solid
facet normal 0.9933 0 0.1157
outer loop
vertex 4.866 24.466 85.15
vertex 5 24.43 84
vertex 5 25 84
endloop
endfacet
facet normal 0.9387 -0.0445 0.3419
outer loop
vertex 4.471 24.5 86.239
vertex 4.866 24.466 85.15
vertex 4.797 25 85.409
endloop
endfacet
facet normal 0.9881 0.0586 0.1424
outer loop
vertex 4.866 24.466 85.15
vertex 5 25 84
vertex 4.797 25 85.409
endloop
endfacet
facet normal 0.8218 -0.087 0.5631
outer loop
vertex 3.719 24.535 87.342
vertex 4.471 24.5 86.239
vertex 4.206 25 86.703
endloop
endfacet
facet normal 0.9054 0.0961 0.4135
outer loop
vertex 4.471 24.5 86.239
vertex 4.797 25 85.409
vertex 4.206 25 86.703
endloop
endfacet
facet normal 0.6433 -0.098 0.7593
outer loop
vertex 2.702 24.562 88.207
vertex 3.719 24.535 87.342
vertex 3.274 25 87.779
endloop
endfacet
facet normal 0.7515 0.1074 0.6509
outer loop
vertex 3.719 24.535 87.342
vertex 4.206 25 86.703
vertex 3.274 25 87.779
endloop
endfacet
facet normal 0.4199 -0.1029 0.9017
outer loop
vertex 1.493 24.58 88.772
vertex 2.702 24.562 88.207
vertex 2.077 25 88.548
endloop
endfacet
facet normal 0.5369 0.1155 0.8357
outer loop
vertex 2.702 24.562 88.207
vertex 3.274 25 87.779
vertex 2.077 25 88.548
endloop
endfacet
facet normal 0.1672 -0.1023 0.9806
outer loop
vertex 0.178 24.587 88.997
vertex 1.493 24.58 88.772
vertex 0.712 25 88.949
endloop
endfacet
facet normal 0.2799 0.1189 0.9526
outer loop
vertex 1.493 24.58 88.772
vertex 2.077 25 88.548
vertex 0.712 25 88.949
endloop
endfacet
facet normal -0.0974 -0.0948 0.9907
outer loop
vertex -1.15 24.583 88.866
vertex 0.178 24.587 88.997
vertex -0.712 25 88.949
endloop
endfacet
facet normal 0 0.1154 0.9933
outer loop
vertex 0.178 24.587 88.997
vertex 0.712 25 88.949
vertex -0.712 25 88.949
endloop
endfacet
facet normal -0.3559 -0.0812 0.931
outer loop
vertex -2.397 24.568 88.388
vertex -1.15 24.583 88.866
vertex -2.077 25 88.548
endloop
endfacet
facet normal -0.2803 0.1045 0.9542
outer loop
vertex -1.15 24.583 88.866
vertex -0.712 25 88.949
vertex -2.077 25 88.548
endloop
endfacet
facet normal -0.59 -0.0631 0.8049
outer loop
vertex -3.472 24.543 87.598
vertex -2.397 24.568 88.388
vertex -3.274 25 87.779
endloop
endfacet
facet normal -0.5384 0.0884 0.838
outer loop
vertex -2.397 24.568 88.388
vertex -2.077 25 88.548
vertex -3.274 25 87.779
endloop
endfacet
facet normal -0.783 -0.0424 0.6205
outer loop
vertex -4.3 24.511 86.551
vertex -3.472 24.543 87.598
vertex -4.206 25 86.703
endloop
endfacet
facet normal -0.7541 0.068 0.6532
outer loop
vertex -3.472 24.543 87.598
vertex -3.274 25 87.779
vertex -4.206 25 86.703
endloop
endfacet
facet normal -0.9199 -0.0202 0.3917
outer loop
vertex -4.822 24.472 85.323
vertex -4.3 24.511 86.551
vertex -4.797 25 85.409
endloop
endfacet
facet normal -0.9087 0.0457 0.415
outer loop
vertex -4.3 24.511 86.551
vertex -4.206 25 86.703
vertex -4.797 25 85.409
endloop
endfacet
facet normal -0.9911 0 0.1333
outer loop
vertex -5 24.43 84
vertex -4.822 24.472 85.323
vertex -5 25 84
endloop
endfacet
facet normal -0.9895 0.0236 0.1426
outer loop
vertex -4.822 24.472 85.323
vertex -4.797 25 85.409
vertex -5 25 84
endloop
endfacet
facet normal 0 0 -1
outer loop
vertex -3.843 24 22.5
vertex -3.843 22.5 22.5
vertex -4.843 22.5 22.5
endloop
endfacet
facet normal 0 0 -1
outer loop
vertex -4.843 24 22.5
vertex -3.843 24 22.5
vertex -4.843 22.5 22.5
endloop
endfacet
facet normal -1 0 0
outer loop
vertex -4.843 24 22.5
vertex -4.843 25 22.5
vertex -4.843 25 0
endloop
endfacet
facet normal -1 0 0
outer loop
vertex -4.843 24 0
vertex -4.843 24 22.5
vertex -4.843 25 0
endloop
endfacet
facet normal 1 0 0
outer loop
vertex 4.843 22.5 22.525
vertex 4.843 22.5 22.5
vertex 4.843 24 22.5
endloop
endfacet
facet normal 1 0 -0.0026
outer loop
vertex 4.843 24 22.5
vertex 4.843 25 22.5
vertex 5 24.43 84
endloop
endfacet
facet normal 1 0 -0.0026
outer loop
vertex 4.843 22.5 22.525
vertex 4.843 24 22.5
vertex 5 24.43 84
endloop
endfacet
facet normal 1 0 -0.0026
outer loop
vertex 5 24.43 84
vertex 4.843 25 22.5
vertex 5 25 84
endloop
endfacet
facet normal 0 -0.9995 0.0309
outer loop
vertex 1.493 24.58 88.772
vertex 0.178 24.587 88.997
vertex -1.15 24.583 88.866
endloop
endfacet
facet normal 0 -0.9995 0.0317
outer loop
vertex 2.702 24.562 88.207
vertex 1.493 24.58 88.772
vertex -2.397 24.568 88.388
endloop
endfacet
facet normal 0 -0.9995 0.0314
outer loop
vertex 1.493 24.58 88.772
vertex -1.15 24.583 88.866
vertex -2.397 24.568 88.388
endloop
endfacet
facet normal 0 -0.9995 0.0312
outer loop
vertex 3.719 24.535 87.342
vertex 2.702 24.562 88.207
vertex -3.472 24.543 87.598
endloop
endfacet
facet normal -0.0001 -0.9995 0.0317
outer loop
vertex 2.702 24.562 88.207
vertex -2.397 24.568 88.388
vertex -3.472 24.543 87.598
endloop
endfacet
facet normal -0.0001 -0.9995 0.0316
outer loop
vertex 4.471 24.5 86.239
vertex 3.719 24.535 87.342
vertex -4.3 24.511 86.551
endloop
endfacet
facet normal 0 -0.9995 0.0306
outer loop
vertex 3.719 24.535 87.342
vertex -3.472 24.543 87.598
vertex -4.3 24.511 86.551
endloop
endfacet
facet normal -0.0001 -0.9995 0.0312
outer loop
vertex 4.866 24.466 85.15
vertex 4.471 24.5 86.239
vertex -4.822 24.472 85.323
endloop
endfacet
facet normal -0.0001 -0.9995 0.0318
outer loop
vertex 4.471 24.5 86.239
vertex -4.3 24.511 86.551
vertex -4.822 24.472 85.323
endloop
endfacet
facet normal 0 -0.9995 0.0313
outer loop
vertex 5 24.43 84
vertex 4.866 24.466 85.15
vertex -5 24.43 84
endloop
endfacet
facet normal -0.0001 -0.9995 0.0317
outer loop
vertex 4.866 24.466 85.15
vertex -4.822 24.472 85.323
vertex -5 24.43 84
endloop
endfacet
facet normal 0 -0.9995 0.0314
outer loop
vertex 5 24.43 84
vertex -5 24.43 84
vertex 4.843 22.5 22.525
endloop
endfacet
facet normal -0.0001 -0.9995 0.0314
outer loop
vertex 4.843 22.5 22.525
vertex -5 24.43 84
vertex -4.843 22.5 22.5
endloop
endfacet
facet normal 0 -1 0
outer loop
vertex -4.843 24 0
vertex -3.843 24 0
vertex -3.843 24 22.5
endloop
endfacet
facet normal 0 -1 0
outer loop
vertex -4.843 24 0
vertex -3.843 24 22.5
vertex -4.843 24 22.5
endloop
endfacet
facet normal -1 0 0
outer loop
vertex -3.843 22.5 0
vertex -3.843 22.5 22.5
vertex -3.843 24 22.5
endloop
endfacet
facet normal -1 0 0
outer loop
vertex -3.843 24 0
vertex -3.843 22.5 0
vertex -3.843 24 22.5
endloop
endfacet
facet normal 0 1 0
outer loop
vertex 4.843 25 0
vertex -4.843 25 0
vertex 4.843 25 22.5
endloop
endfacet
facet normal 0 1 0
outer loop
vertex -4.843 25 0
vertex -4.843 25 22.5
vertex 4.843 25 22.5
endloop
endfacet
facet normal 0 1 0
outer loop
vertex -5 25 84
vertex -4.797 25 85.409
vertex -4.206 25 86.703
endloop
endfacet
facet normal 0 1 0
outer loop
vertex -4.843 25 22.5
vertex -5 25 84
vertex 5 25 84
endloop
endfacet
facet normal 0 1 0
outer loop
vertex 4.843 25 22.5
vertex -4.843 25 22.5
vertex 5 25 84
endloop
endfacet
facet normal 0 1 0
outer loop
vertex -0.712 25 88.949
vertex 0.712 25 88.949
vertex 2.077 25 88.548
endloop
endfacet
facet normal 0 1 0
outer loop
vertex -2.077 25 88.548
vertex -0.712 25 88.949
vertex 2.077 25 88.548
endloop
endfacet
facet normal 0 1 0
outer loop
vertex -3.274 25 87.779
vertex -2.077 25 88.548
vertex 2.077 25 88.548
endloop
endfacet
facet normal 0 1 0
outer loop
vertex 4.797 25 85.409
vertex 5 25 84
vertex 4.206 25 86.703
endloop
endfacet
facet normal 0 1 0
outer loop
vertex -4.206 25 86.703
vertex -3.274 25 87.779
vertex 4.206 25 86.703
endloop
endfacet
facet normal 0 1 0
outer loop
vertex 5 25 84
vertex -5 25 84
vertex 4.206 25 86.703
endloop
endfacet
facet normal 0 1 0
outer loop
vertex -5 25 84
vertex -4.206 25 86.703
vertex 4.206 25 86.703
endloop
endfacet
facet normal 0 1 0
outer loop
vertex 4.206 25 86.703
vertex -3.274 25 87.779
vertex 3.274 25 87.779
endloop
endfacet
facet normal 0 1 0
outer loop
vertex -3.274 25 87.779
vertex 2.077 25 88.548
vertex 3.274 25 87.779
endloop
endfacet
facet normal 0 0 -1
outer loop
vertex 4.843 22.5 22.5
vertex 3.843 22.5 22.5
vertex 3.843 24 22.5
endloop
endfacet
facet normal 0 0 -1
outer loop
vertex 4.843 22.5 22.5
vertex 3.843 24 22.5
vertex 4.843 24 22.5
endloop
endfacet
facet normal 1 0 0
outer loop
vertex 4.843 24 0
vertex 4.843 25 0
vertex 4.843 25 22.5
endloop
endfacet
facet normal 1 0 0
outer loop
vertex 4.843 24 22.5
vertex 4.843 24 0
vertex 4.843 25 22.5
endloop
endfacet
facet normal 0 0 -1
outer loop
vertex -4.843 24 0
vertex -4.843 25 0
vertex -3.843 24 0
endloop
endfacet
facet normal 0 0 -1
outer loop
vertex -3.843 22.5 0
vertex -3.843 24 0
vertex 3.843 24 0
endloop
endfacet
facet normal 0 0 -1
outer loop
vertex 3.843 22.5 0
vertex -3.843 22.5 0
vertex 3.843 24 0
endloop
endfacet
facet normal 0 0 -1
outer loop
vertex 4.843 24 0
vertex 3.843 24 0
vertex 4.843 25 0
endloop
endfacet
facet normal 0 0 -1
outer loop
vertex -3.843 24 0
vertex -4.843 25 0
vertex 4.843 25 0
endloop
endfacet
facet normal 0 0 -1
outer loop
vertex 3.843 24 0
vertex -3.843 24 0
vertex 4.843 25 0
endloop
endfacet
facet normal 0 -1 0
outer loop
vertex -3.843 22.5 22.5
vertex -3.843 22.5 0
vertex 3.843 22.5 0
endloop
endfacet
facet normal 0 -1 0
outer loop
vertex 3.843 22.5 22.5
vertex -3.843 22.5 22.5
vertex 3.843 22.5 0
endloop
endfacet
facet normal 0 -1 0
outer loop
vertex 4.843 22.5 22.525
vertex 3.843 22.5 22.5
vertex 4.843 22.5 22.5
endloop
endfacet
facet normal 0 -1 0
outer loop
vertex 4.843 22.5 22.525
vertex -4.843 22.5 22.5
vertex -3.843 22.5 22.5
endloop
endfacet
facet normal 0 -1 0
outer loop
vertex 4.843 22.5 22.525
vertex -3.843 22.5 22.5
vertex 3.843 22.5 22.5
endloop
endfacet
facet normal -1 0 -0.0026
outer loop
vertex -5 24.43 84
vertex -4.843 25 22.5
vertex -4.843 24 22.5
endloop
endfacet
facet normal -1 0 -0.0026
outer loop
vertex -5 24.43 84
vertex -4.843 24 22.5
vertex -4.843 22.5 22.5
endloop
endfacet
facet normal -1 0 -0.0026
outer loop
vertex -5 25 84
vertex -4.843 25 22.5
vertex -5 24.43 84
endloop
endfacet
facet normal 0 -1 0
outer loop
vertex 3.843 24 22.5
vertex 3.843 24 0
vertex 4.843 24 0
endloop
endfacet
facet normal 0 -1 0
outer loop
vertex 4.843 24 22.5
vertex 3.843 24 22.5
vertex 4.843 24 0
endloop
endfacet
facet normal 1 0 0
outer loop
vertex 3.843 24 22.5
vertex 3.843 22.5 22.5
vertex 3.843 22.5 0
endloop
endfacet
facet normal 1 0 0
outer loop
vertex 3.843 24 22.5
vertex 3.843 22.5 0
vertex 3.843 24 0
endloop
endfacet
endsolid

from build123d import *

# Parameters (mm, degrees)
PAD003_DEPTH    = 2.5
POCKET004_DEPTH = 22.5
POCKET005_DEPTH = 10.013736


with BuildPart() as part:
    # Sketch010 → Pad003 (new body)
    with BuildSketch(Plane.XZ):
        with BuildLine():
            Line((-4.84295, 0), (4.84295, 0))
            Line((4.84295, 0), (4.84295, 22.5))
            Line((4.84295, 22.5), (5, 84))
            ThreePointArc((5, 84), (0, 89), (-5, 84))
            Line((-4.84295, 22.5), (-5, 84))
            Line((-4.84295, 22.5), (-4.84295, 0))
        make_face()
    extrude(amount=PAD003_DEPTH)

    # Sketch011 (on Face1 of Pad003) → Pocket004 (cut)
    with BuildSketch(Plane(origin=(0, 0, 0), x_dir=(1, 0, 0), z_dir=(0, 0, -1))):
        Polygon((-3.84295, 2.5), (-3.84295, 1), (-8.84295, 1), (-8.84295, 6.001038), align=None)
        Polygon((8.84295, 6.001038), (3.84295, 2.5), (3.84295, 1), (8.84295, 1), align=None)
    extrude(amount=-POCKET004_DEPTH, mode=Mode.SUBTRACT)

    # Sketch012 (on Face12 of Pocket004) → Pocket005 (cut, through all)
    with BuildSketch(Plane(origin=(-4.785462, 0, -0.01222), x_dir=(0.002554, 0, -0.999997), z_dir=(-0.999997, 0, -0.002554))):
        Polygon((-89.412494, 0.4), (-22.512294, 2.5), (-89.412494, 14.23), align=None)
    extrude(amount=-POCKET005_DEPTH, mode=Mode.SUBTRACT)


with BuildPart() as part_1:
    # Body001 placement: moved
    add(part.part.moved(Location((0, 25, 0))))


solid = part_1.part
